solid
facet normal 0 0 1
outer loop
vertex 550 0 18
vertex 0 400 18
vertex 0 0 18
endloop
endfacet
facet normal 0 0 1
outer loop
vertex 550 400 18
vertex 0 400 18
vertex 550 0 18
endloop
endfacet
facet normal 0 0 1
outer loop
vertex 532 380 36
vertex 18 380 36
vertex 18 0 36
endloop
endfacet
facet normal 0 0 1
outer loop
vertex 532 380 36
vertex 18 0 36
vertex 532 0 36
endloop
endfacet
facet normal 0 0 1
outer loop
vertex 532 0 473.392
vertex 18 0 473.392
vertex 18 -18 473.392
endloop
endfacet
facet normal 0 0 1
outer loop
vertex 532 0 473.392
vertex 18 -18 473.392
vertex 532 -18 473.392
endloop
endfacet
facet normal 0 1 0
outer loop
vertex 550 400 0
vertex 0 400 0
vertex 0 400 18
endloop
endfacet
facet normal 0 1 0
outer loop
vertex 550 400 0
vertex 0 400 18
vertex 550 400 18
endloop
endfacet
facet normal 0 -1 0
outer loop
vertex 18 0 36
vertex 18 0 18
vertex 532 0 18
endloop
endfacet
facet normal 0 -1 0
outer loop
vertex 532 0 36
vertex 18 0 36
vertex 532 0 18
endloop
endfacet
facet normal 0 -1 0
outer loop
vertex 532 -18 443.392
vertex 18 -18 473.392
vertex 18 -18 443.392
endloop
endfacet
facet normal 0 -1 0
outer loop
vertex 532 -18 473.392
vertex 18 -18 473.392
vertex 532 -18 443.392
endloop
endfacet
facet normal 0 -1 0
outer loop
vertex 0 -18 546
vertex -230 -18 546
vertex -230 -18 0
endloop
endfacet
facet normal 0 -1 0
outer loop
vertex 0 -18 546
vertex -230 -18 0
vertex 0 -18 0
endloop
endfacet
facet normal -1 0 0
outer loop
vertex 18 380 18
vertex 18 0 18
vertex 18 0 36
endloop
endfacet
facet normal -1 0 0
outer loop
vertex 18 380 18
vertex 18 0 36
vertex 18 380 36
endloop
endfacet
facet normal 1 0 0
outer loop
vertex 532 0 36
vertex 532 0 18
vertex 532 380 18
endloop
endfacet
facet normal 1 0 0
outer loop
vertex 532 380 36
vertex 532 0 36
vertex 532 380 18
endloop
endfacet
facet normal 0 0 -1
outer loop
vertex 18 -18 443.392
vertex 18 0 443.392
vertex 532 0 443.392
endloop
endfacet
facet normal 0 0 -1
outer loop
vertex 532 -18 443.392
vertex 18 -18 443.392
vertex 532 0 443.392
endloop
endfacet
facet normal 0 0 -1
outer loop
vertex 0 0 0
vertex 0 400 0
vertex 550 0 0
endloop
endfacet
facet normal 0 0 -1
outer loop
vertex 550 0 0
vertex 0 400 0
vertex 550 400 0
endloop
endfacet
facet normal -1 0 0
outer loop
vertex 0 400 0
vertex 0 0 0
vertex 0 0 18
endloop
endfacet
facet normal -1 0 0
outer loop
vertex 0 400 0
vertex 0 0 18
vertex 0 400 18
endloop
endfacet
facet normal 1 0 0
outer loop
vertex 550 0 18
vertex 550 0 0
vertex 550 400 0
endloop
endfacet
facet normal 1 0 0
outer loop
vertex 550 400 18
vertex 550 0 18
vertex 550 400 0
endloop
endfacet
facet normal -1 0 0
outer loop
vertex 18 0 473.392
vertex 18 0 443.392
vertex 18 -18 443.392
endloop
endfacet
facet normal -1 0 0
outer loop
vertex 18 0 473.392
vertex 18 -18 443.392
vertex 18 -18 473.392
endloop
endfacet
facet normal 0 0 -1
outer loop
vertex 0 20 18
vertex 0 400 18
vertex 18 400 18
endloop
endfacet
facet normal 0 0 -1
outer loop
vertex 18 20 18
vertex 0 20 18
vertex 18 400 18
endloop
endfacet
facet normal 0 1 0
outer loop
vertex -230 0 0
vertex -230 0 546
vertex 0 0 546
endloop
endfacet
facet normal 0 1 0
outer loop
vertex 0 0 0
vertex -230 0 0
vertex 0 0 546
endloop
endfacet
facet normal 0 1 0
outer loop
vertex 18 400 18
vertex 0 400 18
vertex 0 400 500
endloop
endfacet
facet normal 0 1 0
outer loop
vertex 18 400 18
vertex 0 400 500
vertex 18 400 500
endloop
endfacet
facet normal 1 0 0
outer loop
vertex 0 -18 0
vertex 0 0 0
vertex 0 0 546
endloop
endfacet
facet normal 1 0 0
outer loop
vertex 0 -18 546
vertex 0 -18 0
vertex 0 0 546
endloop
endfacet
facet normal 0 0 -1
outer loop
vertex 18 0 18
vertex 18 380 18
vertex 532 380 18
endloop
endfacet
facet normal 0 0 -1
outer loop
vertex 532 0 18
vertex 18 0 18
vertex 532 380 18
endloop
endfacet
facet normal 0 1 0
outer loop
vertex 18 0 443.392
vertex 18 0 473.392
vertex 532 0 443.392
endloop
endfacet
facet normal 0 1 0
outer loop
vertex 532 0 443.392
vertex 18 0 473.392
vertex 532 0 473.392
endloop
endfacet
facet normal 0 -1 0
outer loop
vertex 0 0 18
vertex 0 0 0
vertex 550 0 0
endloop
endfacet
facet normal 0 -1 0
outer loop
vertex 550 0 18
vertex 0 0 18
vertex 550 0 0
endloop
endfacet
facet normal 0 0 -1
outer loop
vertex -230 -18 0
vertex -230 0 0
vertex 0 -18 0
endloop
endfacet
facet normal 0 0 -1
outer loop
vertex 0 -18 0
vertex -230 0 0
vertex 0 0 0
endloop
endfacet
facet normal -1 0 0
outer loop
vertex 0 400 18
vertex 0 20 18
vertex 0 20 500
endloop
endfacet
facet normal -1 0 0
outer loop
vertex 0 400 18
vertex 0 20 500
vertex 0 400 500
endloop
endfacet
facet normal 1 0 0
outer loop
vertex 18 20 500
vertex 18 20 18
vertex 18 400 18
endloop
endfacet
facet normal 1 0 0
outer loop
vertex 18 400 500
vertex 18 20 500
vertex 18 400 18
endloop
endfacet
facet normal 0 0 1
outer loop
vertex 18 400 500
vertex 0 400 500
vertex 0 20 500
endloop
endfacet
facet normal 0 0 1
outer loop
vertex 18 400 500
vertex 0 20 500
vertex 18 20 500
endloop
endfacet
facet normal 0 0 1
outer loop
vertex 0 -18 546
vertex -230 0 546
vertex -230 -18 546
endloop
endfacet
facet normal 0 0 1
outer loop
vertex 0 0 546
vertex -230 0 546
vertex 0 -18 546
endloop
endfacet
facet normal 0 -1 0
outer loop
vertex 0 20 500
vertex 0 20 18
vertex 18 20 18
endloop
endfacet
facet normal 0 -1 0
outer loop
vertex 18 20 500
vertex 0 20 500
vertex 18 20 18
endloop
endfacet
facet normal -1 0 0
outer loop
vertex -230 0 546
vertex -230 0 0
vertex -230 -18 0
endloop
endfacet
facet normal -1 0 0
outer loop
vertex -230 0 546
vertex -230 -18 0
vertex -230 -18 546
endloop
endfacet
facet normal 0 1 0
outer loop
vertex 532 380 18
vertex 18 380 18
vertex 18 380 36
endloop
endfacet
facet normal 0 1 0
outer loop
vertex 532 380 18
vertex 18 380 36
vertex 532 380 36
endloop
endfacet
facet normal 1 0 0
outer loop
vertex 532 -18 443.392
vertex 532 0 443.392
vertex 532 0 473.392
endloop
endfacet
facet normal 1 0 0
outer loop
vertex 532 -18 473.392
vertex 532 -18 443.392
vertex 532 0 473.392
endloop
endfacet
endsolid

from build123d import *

# Parameters (mm, degrees)
F0_W     = 550
F0_H     = 400
F1_DEPTH = 18
F2_W     = 18
F2_H     = 380
F3_DEPTH = 482
F4_W     = 514
F4_H     = 30
F5_DEPTH = 18
F6_W     = 514
F6_H     = 380
F7_DEPTH = 18
F8_W     = 230
F8_H     = 546
F9_DEPTH = 18


with BuildPart() as f1:
    # F0 (on Top) → F1 (new body)
    with BuildSketch(Plane.XY):
        with Locations((275, 200)):
            Rectangle(F0_W, F0_H)
    extrude(amount=F1_DEPTH)


with BuildPart() as f3:
    # F2 (on face) → F3 (new body)
    with BuildSketch(Plane.XY.offset(18)):
        with Locations((9, 210)):
            Rectangle(F2_W, F2_H)
    extrude(amount=F3_DEPTH)


with BuildPart() as f5:
    # F4 (on Front) → F5 (new body)
    with BuildSketch(Plane.XZ):
        with Locations((275, 458.392456)):
            Rectangle(F4_W, F4_H)
    extrude(amount=F5_DEPTH)


with BuildPart() as f7:
    # F6 (on face) → F7 (new body)
    with BuildSketch(Plane.XY.offset(18)):
        with Locations((275, 190)):
            Rectangle(F6_W, F6_H)
    extrude(amount=F7_DEPTH)


with BuildPart() as f9:
    # F8 (on Front) → F9 (new body)
    with BuildSketch(Plane.XZ):
        with Locations((-115, 273)):
            Rectangle(F8_W, F8_H)
    extrude(amount=F9_DEPTH)


solid = Compound([f1.part, f3.part, f5.part, f7.part, f9.part])
